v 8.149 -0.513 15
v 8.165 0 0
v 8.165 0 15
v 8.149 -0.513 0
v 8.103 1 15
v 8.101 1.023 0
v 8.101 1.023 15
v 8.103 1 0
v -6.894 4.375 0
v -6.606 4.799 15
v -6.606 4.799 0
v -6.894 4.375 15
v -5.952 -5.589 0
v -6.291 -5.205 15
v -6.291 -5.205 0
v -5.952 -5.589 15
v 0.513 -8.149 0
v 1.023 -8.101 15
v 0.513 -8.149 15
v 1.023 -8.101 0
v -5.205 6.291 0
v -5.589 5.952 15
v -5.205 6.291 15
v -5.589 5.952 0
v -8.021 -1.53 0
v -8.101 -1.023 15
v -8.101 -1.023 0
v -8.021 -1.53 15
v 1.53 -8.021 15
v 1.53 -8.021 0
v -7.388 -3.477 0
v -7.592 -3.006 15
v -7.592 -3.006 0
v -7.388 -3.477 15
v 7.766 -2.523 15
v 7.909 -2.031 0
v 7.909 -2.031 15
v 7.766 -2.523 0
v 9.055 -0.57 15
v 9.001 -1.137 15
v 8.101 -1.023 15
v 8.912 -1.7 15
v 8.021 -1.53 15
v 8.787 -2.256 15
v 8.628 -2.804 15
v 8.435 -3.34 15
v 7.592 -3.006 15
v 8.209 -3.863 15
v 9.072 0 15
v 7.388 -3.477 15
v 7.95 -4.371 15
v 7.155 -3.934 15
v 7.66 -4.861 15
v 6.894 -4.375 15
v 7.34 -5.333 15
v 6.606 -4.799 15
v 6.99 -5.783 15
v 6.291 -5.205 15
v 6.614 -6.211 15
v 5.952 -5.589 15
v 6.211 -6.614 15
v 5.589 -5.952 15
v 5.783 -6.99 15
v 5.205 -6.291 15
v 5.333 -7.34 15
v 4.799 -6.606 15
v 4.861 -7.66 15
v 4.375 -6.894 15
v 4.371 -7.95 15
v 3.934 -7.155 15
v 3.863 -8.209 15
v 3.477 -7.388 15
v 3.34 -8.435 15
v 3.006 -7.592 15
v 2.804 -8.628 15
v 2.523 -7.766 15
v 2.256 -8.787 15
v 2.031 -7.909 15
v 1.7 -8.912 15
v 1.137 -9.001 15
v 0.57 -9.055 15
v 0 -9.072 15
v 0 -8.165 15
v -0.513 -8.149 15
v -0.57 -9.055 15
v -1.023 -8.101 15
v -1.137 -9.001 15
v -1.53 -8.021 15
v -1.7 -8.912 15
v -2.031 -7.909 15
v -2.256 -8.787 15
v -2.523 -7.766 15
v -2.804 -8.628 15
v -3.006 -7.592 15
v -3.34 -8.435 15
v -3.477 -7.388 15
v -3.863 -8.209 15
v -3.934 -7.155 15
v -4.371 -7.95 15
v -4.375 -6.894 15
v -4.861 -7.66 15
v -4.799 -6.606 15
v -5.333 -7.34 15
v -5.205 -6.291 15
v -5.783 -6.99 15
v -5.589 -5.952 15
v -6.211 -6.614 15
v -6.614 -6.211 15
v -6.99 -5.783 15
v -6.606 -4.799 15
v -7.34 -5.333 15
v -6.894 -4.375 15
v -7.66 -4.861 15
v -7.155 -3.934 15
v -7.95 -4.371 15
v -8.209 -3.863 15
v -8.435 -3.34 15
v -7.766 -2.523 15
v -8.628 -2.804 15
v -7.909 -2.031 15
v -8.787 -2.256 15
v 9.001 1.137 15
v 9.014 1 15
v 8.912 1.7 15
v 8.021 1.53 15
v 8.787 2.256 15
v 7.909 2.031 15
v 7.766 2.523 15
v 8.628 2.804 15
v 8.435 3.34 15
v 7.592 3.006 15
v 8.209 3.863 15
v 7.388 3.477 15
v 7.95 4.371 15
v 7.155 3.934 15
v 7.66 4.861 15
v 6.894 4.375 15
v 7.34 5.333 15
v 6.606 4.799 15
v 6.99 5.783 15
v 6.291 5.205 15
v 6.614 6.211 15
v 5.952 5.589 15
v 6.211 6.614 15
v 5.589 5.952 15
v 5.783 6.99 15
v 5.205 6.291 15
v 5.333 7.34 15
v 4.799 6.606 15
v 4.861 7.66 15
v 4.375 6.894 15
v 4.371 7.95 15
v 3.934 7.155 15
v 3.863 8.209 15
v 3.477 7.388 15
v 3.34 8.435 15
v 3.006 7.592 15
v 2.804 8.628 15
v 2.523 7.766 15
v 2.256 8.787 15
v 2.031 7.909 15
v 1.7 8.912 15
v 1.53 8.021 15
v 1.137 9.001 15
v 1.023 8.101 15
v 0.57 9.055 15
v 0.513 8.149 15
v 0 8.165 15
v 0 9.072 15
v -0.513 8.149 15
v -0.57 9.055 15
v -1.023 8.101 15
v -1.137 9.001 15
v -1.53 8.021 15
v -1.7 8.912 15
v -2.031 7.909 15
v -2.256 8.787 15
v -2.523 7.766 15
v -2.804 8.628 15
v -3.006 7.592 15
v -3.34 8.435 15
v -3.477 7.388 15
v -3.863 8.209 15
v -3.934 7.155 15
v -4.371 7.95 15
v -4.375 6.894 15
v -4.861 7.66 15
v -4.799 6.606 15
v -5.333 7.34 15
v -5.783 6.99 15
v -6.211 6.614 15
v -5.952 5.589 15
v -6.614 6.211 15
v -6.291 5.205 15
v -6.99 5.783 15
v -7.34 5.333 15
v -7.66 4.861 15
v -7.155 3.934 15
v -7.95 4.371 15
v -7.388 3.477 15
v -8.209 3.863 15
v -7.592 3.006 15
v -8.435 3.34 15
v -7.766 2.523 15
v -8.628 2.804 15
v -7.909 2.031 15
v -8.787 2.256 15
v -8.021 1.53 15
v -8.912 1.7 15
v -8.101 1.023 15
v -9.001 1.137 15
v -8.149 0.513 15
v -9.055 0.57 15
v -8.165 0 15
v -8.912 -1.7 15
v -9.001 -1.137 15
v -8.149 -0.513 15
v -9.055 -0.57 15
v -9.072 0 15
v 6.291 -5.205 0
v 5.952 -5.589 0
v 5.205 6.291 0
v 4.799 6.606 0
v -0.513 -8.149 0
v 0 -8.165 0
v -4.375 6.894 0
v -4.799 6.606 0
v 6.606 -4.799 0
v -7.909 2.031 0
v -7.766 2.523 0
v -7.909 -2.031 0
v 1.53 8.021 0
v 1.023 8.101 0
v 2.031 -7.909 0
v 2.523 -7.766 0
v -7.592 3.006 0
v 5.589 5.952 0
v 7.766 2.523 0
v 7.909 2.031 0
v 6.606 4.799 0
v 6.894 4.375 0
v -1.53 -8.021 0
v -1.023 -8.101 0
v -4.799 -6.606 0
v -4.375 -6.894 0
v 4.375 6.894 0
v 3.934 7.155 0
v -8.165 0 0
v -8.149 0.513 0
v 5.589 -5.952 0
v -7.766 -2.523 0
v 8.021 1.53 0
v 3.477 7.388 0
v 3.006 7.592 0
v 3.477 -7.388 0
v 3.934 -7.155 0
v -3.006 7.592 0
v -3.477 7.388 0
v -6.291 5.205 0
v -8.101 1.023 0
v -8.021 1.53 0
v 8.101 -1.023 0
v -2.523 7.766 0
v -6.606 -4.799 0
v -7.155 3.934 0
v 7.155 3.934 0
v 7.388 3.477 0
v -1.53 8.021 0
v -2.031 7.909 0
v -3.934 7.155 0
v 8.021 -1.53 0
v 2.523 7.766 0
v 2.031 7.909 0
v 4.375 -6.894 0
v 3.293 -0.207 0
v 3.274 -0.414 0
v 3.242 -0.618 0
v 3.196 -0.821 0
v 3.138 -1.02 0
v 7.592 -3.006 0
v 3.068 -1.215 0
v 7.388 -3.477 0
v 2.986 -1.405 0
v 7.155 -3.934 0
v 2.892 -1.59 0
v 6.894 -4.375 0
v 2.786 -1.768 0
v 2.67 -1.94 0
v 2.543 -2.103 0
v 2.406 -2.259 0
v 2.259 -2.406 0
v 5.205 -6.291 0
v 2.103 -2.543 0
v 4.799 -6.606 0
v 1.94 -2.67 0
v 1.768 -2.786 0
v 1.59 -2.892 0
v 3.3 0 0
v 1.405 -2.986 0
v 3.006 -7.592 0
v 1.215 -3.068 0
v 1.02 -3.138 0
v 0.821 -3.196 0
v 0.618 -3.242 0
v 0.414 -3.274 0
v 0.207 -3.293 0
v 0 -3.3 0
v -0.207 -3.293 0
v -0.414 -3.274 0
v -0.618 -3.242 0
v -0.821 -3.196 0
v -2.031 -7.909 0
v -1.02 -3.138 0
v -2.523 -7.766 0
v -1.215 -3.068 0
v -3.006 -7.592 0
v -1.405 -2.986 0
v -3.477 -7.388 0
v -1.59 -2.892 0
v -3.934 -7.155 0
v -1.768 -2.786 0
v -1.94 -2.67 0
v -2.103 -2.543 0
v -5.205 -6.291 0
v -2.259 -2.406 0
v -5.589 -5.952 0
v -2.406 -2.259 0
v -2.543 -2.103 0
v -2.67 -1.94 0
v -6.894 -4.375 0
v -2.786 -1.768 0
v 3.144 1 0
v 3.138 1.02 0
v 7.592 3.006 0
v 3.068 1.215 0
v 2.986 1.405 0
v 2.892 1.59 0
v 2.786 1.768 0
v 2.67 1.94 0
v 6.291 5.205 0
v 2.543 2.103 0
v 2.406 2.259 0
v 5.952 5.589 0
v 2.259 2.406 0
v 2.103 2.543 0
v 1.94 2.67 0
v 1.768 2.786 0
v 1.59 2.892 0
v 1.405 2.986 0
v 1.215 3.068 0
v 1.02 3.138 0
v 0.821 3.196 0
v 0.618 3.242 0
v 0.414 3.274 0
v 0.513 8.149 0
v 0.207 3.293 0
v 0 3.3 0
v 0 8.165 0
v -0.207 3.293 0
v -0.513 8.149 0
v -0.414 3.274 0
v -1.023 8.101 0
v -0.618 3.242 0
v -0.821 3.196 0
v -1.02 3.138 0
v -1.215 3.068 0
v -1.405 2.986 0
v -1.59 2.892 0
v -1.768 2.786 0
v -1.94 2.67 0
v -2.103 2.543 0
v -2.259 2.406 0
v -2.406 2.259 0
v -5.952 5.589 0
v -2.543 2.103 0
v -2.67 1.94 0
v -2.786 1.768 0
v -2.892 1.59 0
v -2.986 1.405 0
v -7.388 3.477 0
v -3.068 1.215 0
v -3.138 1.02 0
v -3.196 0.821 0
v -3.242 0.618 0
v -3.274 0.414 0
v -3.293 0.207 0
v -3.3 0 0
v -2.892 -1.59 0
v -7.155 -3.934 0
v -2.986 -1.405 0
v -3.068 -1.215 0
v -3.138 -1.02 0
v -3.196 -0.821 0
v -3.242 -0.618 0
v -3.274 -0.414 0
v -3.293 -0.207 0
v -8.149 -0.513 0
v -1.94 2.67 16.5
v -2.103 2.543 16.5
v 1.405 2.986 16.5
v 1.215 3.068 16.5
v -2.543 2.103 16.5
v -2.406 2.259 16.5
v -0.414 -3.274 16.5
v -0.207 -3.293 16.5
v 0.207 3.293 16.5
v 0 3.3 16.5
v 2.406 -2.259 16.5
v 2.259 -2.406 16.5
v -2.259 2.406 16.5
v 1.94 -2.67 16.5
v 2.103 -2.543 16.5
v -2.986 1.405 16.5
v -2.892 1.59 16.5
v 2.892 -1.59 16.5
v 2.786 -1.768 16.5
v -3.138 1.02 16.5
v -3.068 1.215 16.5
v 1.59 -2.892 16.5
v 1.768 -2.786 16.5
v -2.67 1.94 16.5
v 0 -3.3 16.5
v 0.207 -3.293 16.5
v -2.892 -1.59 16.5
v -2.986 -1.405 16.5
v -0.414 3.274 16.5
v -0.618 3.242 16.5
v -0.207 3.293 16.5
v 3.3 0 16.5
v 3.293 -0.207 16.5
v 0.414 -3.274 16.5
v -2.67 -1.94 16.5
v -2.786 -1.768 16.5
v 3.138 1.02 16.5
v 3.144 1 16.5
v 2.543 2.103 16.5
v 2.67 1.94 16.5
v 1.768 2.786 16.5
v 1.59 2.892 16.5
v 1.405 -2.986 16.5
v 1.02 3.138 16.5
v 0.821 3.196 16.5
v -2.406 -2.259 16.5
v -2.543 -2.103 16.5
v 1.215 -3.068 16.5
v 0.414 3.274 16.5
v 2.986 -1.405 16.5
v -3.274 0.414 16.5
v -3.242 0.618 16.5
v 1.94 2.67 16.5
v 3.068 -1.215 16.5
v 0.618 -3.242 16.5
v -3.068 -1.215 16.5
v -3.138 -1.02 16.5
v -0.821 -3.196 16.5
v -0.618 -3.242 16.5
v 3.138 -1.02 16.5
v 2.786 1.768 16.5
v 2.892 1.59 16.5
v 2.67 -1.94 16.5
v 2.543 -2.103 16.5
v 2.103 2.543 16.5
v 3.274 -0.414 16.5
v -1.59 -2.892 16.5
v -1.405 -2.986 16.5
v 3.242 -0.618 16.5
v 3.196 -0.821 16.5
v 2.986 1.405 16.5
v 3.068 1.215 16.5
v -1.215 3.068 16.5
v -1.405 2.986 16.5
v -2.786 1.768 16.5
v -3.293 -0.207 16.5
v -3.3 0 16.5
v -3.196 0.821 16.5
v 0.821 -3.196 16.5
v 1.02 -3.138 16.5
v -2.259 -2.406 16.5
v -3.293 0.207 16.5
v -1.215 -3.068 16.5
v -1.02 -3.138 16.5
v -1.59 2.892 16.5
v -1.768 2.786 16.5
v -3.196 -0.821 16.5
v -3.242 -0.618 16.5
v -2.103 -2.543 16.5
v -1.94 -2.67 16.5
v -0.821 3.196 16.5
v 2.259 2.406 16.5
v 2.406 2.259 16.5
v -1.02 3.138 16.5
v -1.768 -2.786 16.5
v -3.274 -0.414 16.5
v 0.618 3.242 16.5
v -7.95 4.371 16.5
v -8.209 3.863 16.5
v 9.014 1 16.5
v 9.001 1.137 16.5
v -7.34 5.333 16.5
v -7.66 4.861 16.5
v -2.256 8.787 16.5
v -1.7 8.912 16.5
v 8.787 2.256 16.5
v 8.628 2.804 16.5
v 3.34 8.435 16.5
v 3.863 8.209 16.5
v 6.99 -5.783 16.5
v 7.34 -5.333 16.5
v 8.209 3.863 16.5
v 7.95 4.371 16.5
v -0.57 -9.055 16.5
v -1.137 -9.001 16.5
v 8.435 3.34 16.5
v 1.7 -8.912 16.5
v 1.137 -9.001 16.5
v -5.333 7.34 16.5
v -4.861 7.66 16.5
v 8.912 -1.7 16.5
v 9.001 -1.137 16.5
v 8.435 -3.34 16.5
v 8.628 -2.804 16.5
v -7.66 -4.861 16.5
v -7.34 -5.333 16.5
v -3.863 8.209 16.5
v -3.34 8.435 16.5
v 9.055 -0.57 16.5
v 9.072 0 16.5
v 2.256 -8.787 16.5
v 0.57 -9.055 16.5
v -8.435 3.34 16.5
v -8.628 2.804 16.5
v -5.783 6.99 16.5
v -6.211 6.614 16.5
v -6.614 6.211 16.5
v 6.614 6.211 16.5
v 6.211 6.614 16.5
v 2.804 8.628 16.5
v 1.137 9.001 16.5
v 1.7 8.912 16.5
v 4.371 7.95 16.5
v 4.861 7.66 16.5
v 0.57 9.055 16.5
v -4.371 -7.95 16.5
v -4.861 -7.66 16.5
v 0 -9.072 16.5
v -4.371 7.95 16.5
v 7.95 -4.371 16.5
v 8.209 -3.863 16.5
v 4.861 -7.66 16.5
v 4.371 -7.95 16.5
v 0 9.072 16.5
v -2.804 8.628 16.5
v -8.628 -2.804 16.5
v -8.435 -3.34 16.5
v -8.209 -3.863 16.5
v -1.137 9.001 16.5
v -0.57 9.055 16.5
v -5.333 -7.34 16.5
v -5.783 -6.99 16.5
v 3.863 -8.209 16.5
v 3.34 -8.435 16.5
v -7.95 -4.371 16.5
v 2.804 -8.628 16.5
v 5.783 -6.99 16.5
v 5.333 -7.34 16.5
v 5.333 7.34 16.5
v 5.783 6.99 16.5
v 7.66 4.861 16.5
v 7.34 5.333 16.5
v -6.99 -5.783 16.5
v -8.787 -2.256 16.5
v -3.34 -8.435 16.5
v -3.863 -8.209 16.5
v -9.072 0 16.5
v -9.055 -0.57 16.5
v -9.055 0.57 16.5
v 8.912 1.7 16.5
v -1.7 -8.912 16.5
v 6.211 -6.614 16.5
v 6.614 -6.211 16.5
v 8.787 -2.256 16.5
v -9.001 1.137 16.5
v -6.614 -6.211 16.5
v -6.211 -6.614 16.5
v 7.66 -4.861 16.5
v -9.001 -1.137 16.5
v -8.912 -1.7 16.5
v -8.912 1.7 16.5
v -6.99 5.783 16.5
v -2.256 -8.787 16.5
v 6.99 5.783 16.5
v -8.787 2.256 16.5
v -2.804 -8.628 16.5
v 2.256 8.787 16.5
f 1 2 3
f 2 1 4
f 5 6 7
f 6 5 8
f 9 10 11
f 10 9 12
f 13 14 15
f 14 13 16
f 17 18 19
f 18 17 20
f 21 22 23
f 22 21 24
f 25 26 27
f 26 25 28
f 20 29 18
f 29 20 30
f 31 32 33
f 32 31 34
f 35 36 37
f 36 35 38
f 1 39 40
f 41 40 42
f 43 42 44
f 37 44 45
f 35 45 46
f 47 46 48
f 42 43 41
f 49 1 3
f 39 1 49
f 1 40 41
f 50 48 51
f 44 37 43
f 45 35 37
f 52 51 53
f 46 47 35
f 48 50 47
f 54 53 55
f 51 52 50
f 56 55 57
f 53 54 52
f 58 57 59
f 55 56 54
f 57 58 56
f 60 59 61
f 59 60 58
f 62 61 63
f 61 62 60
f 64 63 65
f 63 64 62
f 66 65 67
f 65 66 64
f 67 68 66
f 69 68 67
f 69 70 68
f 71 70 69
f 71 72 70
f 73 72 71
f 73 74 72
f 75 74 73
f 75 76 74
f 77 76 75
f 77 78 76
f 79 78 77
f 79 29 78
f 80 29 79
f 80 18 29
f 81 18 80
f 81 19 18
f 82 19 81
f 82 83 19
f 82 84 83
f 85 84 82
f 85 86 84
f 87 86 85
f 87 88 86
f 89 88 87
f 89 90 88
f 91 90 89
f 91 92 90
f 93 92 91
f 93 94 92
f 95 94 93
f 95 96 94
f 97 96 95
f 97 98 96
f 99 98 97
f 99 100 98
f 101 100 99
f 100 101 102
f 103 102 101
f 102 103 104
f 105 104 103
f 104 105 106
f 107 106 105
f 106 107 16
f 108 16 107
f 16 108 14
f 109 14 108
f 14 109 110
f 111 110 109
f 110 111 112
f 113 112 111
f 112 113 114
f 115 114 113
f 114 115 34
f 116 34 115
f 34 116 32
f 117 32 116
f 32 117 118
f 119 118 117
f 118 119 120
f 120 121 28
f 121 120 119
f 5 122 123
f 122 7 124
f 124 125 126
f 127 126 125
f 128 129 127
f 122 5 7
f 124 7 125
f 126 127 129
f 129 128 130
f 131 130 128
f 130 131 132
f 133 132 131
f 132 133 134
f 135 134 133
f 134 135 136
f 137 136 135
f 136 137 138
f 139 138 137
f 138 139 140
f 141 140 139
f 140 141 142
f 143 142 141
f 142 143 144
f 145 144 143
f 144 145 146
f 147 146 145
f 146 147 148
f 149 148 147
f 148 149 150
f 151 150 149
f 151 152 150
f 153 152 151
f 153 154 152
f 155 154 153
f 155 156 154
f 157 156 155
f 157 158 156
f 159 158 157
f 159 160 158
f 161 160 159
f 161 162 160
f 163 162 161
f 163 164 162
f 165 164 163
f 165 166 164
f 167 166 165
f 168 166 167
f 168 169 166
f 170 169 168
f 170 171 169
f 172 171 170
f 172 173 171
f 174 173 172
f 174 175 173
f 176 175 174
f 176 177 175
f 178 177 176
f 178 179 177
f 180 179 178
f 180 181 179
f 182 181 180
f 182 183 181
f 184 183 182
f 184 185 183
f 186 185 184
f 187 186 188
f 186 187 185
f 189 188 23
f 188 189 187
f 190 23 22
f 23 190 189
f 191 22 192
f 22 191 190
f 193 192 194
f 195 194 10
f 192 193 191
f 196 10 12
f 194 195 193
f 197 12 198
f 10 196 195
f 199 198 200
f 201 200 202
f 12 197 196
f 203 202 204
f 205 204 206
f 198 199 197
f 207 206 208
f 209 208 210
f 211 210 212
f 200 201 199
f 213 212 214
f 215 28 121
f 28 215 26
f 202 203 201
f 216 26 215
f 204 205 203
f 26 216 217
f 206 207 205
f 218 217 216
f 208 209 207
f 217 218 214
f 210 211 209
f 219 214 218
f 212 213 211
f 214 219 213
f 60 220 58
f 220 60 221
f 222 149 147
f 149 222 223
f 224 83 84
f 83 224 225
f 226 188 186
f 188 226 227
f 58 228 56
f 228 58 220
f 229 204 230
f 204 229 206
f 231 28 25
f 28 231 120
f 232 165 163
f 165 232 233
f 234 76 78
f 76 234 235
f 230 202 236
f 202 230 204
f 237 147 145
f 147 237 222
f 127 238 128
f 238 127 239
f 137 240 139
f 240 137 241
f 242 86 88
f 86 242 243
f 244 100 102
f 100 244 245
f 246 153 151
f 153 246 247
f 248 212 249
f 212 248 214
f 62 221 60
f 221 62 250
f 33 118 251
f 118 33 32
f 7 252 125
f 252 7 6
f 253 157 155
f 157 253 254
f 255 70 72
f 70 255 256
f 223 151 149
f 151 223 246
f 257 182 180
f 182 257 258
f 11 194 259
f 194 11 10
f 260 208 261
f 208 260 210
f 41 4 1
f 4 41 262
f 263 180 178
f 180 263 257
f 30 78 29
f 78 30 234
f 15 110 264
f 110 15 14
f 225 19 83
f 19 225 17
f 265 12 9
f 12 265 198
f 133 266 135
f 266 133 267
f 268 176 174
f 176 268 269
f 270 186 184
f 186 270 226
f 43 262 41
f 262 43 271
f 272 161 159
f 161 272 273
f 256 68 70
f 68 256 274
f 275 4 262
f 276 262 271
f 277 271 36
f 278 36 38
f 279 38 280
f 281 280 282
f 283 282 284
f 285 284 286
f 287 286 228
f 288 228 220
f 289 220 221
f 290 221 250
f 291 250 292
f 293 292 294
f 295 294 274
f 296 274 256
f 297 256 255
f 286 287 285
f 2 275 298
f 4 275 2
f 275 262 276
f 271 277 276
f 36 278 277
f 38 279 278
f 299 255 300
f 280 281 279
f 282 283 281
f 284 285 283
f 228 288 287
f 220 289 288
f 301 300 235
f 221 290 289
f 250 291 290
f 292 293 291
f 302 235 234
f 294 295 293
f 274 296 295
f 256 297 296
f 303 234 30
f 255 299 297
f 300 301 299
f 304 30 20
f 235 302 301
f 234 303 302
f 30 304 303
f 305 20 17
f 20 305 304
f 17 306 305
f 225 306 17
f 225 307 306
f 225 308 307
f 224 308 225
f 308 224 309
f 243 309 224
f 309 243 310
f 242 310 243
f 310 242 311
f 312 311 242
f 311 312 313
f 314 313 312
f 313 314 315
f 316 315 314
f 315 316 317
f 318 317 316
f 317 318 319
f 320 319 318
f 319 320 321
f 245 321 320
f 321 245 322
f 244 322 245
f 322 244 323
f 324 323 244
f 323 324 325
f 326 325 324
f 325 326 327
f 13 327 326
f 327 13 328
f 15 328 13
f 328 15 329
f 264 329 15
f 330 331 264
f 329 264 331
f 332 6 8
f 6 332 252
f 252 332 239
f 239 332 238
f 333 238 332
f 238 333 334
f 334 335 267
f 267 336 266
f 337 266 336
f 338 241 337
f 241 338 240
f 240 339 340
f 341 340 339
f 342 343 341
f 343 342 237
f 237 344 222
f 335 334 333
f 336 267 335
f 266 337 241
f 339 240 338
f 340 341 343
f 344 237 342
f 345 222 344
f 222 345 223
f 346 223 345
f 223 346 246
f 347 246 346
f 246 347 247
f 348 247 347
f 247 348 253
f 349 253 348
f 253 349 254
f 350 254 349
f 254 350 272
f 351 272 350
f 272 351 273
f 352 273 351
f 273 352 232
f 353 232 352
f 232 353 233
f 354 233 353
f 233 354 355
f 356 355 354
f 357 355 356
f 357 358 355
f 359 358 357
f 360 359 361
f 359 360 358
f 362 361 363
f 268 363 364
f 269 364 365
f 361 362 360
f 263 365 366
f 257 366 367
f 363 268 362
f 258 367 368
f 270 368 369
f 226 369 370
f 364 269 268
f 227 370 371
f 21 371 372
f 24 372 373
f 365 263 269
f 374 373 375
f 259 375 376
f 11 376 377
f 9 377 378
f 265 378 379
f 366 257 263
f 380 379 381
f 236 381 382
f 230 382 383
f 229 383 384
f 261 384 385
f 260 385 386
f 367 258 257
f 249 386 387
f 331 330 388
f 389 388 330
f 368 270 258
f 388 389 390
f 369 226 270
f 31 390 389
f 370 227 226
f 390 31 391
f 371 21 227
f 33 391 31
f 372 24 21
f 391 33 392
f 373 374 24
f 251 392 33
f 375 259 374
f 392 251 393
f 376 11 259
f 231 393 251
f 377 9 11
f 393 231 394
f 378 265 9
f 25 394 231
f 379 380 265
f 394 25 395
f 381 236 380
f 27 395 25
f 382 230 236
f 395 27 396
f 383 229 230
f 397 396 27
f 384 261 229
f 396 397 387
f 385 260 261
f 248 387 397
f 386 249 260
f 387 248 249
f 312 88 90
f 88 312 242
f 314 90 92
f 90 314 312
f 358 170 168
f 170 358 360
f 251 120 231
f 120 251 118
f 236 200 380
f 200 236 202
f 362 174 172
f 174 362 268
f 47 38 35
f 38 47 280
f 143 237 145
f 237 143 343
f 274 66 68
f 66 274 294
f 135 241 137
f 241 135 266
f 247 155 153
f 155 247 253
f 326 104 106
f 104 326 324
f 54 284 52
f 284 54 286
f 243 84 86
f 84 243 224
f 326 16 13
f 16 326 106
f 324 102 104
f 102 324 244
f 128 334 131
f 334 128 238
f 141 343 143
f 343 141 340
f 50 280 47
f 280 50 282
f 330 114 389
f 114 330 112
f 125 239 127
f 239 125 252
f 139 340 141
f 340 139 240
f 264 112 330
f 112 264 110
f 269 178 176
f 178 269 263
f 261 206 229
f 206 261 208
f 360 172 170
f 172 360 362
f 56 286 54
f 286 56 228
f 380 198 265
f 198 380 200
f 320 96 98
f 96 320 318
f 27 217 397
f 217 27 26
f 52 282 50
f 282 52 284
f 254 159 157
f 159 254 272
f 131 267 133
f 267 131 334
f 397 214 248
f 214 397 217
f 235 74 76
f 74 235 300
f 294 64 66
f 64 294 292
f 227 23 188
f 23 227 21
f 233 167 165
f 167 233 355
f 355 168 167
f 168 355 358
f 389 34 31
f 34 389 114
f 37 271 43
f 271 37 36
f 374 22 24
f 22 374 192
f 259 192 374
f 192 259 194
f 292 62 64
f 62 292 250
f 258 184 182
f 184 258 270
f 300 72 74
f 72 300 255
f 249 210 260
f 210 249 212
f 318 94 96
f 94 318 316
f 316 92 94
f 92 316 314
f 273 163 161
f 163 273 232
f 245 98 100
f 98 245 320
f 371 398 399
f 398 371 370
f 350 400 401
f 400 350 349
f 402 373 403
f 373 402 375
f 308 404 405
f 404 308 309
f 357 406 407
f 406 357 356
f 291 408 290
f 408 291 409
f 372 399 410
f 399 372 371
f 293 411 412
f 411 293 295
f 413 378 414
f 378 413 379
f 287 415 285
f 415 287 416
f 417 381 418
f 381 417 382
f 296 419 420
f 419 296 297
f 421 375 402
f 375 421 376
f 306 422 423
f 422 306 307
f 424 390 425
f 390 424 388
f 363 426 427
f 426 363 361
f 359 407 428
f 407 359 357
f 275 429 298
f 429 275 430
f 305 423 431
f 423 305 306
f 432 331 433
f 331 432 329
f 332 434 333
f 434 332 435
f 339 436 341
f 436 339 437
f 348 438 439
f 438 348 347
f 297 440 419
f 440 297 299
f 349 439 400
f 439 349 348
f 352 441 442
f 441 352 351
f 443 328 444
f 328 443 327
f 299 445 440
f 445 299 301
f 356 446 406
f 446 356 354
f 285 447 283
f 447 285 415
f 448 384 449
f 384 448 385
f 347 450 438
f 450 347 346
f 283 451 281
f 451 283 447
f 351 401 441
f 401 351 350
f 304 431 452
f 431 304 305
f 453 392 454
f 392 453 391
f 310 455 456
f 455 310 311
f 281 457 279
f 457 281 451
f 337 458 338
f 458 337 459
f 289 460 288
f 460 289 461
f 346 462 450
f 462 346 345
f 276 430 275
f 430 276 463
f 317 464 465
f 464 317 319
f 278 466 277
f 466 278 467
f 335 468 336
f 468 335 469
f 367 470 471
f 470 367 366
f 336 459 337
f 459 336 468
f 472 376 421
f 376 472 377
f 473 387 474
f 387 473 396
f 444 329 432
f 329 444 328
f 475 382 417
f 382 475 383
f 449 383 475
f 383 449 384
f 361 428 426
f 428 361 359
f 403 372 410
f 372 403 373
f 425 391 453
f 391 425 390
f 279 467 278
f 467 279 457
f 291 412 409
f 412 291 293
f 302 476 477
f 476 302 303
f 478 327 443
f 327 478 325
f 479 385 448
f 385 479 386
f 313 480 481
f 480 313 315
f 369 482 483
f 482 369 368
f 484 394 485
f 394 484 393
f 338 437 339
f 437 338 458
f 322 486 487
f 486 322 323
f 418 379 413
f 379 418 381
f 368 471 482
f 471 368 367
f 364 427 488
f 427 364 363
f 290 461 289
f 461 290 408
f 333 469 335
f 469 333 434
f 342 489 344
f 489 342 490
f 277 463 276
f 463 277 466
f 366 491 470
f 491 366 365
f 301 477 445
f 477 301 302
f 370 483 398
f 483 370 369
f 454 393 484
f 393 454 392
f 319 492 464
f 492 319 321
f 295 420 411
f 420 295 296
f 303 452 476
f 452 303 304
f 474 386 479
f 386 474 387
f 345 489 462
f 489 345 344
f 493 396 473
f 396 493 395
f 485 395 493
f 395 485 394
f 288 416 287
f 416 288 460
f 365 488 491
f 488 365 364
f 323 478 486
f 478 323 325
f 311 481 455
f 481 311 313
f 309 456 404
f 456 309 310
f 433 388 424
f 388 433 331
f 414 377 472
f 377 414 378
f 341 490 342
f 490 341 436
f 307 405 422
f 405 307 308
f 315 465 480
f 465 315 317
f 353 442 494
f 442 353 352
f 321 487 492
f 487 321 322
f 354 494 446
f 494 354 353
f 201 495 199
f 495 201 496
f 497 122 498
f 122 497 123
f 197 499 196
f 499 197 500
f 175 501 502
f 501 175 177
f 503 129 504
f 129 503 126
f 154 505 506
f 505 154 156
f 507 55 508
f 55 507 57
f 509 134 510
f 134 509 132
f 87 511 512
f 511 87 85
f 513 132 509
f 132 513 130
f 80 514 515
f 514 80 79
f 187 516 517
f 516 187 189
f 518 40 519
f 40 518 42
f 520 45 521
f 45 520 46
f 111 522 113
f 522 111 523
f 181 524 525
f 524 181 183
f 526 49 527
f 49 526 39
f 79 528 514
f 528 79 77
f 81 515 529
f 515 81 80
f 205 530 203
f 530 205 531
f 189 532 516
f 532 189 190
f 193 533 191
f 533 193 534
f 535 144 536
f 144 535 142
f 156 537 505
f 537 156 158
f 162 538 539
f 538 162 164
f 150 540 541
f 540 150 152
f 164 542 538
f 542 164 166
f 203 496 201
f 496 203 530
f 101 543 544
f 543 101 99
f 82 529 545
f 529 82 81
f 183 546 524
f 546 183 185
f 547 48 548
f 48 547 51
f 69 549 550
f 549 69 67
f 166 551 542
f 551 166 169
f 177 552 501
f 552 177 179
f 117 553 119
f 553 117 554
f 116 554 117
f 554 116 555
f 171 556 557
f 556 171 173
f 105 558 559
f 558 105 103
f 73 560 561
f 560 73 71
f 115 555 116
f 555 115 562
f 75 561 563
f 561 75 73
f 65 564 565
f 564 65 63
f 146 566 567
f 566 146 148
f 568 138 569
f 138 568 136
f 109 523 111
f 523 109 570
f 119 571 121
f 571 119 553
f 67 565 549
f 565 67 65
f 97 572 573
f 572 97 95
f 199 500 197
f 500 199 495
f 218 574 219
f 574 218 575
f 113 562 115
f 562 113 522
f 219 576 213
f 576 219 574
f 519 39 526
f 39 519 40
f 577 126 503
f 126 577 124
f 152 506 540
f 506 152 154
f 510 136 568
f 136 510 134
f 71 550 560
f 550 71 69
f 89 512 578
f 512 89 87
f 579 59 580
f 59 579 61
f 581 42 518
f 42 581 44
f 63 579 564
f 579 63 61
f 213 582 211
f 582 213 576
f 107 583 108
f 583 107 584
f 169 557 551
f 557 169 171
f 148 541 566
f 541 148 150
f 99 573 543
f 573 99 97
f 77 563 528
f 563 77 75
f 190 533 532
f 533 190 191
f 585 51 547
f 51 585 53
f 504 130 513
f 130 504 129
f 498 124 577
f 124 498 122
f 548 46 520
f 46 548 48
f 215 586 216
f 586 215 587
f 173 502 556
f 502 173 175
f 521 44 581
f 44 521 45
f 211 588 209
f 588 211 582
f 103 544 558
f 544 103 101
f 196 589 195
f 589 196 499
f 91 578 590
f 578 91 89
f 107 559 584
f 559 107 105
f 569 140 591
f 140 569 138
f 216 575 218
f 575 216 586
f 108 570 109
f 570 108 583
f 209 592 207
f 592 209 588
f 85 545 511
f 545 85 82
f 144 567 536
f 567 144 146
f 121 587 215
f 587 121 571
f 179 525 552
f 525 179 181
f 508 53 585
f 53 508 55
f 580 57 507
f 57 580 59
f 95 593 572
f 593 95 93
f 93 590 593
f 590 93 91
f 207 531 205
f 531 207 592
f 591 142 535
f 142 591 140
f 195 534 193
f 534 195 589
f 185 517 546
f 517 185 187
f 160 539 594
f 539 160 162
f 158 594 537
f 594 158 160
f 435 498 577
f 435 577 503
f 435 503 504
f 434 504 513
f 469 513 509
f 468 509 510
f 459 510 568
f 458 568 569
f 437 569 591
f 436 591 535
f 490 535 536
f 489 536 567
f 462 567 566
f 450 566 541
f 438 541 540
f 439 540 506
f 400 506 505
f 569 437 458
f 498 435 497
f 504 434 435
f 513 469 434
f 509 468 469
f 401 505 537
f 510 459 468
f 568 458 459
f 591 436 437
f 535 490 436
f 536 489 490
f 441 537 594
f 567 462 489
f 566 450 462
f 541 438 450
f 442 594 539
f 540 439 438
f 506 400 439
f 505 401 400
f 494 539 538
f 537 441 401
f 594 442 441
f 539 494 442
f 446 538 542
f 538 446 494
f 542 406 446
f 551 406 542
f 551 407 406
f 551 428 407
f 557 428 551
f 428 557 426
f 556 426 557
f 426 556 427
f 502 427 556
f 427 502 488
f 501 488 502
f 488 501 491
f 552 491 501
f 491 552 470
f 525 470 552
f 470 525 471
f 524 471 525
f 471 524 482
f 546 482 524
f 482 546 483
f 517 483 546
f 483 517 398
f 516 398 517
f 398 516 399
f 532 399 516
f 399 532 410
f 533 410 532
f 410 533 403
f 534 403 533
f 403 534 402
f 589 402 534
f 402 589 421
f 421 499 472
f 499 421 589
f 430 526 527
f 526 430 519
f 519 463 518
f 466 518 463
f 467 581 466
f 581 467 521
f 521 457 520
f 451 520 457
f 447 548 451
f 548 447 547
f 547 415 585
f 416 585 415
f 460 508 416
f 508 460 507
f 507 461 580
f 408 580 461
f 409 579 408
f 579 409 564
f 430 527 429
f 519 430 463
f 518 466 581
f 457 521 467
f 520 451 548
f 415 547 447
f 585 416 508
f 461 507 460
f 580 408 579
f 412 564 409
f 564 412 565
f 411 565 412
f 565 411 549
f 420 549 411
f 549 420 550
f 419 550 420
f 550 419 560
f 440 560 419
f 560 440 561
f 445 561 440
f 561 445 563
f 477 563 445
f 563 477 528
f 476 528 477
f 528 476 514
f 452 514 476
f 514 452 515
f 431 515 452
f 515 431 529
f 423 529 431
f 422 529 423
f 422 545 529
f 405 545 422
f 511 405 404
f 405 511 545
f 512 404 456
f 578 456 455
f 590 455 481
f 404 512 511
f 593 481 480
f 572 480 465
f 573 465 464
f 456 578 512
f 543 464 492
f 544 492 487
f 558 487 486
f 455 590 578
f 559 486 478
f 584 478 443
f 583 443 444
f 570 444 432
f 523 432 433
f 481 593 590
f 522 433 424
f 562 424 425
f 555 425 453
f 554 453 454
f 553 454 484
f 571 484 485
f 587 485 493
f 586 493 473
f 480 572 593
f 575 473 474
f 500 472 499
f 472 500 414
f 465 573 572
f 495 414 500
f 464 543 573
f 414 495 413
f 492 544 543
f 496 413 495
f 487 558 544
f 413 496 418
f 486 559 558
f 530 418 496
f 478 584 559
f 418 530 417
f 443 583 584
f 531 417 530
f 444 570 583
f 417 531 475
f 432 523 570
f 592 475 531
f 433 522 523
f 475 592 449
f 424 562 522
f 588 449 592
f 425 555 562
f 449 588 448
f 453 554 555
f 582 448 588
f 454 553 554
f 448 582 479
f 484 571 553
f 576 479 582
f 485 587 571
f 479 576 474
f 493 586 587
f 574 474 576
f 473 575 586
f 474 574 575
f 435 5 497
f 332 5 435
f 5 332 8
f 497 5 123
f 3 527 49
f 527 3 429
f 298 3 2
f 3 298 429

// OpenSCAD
$fn = 100;
outer = 19.1; // 3/4"
inner = outer * .9;
length = 15;

cable_dia = 6;

difference(){
  union() {
  //main tube
    difference() {
      //outer tube
      cylinder(d = inner * .95, h = length);
      //inner tube
      cylinder(d = cable_dia * 1.1, h = length);
    }
  //collar
    translate([0,0,length])
    difference() {
      //outer tube
      cylinder(d = outer * .95, h = length * 0.1);
      //inner tube
      cylinder(d = cable_dia * 1.1, h = length * 0.1);
    }
  }

//slice
cube([outer,1,length + length * 0.1]);
}
